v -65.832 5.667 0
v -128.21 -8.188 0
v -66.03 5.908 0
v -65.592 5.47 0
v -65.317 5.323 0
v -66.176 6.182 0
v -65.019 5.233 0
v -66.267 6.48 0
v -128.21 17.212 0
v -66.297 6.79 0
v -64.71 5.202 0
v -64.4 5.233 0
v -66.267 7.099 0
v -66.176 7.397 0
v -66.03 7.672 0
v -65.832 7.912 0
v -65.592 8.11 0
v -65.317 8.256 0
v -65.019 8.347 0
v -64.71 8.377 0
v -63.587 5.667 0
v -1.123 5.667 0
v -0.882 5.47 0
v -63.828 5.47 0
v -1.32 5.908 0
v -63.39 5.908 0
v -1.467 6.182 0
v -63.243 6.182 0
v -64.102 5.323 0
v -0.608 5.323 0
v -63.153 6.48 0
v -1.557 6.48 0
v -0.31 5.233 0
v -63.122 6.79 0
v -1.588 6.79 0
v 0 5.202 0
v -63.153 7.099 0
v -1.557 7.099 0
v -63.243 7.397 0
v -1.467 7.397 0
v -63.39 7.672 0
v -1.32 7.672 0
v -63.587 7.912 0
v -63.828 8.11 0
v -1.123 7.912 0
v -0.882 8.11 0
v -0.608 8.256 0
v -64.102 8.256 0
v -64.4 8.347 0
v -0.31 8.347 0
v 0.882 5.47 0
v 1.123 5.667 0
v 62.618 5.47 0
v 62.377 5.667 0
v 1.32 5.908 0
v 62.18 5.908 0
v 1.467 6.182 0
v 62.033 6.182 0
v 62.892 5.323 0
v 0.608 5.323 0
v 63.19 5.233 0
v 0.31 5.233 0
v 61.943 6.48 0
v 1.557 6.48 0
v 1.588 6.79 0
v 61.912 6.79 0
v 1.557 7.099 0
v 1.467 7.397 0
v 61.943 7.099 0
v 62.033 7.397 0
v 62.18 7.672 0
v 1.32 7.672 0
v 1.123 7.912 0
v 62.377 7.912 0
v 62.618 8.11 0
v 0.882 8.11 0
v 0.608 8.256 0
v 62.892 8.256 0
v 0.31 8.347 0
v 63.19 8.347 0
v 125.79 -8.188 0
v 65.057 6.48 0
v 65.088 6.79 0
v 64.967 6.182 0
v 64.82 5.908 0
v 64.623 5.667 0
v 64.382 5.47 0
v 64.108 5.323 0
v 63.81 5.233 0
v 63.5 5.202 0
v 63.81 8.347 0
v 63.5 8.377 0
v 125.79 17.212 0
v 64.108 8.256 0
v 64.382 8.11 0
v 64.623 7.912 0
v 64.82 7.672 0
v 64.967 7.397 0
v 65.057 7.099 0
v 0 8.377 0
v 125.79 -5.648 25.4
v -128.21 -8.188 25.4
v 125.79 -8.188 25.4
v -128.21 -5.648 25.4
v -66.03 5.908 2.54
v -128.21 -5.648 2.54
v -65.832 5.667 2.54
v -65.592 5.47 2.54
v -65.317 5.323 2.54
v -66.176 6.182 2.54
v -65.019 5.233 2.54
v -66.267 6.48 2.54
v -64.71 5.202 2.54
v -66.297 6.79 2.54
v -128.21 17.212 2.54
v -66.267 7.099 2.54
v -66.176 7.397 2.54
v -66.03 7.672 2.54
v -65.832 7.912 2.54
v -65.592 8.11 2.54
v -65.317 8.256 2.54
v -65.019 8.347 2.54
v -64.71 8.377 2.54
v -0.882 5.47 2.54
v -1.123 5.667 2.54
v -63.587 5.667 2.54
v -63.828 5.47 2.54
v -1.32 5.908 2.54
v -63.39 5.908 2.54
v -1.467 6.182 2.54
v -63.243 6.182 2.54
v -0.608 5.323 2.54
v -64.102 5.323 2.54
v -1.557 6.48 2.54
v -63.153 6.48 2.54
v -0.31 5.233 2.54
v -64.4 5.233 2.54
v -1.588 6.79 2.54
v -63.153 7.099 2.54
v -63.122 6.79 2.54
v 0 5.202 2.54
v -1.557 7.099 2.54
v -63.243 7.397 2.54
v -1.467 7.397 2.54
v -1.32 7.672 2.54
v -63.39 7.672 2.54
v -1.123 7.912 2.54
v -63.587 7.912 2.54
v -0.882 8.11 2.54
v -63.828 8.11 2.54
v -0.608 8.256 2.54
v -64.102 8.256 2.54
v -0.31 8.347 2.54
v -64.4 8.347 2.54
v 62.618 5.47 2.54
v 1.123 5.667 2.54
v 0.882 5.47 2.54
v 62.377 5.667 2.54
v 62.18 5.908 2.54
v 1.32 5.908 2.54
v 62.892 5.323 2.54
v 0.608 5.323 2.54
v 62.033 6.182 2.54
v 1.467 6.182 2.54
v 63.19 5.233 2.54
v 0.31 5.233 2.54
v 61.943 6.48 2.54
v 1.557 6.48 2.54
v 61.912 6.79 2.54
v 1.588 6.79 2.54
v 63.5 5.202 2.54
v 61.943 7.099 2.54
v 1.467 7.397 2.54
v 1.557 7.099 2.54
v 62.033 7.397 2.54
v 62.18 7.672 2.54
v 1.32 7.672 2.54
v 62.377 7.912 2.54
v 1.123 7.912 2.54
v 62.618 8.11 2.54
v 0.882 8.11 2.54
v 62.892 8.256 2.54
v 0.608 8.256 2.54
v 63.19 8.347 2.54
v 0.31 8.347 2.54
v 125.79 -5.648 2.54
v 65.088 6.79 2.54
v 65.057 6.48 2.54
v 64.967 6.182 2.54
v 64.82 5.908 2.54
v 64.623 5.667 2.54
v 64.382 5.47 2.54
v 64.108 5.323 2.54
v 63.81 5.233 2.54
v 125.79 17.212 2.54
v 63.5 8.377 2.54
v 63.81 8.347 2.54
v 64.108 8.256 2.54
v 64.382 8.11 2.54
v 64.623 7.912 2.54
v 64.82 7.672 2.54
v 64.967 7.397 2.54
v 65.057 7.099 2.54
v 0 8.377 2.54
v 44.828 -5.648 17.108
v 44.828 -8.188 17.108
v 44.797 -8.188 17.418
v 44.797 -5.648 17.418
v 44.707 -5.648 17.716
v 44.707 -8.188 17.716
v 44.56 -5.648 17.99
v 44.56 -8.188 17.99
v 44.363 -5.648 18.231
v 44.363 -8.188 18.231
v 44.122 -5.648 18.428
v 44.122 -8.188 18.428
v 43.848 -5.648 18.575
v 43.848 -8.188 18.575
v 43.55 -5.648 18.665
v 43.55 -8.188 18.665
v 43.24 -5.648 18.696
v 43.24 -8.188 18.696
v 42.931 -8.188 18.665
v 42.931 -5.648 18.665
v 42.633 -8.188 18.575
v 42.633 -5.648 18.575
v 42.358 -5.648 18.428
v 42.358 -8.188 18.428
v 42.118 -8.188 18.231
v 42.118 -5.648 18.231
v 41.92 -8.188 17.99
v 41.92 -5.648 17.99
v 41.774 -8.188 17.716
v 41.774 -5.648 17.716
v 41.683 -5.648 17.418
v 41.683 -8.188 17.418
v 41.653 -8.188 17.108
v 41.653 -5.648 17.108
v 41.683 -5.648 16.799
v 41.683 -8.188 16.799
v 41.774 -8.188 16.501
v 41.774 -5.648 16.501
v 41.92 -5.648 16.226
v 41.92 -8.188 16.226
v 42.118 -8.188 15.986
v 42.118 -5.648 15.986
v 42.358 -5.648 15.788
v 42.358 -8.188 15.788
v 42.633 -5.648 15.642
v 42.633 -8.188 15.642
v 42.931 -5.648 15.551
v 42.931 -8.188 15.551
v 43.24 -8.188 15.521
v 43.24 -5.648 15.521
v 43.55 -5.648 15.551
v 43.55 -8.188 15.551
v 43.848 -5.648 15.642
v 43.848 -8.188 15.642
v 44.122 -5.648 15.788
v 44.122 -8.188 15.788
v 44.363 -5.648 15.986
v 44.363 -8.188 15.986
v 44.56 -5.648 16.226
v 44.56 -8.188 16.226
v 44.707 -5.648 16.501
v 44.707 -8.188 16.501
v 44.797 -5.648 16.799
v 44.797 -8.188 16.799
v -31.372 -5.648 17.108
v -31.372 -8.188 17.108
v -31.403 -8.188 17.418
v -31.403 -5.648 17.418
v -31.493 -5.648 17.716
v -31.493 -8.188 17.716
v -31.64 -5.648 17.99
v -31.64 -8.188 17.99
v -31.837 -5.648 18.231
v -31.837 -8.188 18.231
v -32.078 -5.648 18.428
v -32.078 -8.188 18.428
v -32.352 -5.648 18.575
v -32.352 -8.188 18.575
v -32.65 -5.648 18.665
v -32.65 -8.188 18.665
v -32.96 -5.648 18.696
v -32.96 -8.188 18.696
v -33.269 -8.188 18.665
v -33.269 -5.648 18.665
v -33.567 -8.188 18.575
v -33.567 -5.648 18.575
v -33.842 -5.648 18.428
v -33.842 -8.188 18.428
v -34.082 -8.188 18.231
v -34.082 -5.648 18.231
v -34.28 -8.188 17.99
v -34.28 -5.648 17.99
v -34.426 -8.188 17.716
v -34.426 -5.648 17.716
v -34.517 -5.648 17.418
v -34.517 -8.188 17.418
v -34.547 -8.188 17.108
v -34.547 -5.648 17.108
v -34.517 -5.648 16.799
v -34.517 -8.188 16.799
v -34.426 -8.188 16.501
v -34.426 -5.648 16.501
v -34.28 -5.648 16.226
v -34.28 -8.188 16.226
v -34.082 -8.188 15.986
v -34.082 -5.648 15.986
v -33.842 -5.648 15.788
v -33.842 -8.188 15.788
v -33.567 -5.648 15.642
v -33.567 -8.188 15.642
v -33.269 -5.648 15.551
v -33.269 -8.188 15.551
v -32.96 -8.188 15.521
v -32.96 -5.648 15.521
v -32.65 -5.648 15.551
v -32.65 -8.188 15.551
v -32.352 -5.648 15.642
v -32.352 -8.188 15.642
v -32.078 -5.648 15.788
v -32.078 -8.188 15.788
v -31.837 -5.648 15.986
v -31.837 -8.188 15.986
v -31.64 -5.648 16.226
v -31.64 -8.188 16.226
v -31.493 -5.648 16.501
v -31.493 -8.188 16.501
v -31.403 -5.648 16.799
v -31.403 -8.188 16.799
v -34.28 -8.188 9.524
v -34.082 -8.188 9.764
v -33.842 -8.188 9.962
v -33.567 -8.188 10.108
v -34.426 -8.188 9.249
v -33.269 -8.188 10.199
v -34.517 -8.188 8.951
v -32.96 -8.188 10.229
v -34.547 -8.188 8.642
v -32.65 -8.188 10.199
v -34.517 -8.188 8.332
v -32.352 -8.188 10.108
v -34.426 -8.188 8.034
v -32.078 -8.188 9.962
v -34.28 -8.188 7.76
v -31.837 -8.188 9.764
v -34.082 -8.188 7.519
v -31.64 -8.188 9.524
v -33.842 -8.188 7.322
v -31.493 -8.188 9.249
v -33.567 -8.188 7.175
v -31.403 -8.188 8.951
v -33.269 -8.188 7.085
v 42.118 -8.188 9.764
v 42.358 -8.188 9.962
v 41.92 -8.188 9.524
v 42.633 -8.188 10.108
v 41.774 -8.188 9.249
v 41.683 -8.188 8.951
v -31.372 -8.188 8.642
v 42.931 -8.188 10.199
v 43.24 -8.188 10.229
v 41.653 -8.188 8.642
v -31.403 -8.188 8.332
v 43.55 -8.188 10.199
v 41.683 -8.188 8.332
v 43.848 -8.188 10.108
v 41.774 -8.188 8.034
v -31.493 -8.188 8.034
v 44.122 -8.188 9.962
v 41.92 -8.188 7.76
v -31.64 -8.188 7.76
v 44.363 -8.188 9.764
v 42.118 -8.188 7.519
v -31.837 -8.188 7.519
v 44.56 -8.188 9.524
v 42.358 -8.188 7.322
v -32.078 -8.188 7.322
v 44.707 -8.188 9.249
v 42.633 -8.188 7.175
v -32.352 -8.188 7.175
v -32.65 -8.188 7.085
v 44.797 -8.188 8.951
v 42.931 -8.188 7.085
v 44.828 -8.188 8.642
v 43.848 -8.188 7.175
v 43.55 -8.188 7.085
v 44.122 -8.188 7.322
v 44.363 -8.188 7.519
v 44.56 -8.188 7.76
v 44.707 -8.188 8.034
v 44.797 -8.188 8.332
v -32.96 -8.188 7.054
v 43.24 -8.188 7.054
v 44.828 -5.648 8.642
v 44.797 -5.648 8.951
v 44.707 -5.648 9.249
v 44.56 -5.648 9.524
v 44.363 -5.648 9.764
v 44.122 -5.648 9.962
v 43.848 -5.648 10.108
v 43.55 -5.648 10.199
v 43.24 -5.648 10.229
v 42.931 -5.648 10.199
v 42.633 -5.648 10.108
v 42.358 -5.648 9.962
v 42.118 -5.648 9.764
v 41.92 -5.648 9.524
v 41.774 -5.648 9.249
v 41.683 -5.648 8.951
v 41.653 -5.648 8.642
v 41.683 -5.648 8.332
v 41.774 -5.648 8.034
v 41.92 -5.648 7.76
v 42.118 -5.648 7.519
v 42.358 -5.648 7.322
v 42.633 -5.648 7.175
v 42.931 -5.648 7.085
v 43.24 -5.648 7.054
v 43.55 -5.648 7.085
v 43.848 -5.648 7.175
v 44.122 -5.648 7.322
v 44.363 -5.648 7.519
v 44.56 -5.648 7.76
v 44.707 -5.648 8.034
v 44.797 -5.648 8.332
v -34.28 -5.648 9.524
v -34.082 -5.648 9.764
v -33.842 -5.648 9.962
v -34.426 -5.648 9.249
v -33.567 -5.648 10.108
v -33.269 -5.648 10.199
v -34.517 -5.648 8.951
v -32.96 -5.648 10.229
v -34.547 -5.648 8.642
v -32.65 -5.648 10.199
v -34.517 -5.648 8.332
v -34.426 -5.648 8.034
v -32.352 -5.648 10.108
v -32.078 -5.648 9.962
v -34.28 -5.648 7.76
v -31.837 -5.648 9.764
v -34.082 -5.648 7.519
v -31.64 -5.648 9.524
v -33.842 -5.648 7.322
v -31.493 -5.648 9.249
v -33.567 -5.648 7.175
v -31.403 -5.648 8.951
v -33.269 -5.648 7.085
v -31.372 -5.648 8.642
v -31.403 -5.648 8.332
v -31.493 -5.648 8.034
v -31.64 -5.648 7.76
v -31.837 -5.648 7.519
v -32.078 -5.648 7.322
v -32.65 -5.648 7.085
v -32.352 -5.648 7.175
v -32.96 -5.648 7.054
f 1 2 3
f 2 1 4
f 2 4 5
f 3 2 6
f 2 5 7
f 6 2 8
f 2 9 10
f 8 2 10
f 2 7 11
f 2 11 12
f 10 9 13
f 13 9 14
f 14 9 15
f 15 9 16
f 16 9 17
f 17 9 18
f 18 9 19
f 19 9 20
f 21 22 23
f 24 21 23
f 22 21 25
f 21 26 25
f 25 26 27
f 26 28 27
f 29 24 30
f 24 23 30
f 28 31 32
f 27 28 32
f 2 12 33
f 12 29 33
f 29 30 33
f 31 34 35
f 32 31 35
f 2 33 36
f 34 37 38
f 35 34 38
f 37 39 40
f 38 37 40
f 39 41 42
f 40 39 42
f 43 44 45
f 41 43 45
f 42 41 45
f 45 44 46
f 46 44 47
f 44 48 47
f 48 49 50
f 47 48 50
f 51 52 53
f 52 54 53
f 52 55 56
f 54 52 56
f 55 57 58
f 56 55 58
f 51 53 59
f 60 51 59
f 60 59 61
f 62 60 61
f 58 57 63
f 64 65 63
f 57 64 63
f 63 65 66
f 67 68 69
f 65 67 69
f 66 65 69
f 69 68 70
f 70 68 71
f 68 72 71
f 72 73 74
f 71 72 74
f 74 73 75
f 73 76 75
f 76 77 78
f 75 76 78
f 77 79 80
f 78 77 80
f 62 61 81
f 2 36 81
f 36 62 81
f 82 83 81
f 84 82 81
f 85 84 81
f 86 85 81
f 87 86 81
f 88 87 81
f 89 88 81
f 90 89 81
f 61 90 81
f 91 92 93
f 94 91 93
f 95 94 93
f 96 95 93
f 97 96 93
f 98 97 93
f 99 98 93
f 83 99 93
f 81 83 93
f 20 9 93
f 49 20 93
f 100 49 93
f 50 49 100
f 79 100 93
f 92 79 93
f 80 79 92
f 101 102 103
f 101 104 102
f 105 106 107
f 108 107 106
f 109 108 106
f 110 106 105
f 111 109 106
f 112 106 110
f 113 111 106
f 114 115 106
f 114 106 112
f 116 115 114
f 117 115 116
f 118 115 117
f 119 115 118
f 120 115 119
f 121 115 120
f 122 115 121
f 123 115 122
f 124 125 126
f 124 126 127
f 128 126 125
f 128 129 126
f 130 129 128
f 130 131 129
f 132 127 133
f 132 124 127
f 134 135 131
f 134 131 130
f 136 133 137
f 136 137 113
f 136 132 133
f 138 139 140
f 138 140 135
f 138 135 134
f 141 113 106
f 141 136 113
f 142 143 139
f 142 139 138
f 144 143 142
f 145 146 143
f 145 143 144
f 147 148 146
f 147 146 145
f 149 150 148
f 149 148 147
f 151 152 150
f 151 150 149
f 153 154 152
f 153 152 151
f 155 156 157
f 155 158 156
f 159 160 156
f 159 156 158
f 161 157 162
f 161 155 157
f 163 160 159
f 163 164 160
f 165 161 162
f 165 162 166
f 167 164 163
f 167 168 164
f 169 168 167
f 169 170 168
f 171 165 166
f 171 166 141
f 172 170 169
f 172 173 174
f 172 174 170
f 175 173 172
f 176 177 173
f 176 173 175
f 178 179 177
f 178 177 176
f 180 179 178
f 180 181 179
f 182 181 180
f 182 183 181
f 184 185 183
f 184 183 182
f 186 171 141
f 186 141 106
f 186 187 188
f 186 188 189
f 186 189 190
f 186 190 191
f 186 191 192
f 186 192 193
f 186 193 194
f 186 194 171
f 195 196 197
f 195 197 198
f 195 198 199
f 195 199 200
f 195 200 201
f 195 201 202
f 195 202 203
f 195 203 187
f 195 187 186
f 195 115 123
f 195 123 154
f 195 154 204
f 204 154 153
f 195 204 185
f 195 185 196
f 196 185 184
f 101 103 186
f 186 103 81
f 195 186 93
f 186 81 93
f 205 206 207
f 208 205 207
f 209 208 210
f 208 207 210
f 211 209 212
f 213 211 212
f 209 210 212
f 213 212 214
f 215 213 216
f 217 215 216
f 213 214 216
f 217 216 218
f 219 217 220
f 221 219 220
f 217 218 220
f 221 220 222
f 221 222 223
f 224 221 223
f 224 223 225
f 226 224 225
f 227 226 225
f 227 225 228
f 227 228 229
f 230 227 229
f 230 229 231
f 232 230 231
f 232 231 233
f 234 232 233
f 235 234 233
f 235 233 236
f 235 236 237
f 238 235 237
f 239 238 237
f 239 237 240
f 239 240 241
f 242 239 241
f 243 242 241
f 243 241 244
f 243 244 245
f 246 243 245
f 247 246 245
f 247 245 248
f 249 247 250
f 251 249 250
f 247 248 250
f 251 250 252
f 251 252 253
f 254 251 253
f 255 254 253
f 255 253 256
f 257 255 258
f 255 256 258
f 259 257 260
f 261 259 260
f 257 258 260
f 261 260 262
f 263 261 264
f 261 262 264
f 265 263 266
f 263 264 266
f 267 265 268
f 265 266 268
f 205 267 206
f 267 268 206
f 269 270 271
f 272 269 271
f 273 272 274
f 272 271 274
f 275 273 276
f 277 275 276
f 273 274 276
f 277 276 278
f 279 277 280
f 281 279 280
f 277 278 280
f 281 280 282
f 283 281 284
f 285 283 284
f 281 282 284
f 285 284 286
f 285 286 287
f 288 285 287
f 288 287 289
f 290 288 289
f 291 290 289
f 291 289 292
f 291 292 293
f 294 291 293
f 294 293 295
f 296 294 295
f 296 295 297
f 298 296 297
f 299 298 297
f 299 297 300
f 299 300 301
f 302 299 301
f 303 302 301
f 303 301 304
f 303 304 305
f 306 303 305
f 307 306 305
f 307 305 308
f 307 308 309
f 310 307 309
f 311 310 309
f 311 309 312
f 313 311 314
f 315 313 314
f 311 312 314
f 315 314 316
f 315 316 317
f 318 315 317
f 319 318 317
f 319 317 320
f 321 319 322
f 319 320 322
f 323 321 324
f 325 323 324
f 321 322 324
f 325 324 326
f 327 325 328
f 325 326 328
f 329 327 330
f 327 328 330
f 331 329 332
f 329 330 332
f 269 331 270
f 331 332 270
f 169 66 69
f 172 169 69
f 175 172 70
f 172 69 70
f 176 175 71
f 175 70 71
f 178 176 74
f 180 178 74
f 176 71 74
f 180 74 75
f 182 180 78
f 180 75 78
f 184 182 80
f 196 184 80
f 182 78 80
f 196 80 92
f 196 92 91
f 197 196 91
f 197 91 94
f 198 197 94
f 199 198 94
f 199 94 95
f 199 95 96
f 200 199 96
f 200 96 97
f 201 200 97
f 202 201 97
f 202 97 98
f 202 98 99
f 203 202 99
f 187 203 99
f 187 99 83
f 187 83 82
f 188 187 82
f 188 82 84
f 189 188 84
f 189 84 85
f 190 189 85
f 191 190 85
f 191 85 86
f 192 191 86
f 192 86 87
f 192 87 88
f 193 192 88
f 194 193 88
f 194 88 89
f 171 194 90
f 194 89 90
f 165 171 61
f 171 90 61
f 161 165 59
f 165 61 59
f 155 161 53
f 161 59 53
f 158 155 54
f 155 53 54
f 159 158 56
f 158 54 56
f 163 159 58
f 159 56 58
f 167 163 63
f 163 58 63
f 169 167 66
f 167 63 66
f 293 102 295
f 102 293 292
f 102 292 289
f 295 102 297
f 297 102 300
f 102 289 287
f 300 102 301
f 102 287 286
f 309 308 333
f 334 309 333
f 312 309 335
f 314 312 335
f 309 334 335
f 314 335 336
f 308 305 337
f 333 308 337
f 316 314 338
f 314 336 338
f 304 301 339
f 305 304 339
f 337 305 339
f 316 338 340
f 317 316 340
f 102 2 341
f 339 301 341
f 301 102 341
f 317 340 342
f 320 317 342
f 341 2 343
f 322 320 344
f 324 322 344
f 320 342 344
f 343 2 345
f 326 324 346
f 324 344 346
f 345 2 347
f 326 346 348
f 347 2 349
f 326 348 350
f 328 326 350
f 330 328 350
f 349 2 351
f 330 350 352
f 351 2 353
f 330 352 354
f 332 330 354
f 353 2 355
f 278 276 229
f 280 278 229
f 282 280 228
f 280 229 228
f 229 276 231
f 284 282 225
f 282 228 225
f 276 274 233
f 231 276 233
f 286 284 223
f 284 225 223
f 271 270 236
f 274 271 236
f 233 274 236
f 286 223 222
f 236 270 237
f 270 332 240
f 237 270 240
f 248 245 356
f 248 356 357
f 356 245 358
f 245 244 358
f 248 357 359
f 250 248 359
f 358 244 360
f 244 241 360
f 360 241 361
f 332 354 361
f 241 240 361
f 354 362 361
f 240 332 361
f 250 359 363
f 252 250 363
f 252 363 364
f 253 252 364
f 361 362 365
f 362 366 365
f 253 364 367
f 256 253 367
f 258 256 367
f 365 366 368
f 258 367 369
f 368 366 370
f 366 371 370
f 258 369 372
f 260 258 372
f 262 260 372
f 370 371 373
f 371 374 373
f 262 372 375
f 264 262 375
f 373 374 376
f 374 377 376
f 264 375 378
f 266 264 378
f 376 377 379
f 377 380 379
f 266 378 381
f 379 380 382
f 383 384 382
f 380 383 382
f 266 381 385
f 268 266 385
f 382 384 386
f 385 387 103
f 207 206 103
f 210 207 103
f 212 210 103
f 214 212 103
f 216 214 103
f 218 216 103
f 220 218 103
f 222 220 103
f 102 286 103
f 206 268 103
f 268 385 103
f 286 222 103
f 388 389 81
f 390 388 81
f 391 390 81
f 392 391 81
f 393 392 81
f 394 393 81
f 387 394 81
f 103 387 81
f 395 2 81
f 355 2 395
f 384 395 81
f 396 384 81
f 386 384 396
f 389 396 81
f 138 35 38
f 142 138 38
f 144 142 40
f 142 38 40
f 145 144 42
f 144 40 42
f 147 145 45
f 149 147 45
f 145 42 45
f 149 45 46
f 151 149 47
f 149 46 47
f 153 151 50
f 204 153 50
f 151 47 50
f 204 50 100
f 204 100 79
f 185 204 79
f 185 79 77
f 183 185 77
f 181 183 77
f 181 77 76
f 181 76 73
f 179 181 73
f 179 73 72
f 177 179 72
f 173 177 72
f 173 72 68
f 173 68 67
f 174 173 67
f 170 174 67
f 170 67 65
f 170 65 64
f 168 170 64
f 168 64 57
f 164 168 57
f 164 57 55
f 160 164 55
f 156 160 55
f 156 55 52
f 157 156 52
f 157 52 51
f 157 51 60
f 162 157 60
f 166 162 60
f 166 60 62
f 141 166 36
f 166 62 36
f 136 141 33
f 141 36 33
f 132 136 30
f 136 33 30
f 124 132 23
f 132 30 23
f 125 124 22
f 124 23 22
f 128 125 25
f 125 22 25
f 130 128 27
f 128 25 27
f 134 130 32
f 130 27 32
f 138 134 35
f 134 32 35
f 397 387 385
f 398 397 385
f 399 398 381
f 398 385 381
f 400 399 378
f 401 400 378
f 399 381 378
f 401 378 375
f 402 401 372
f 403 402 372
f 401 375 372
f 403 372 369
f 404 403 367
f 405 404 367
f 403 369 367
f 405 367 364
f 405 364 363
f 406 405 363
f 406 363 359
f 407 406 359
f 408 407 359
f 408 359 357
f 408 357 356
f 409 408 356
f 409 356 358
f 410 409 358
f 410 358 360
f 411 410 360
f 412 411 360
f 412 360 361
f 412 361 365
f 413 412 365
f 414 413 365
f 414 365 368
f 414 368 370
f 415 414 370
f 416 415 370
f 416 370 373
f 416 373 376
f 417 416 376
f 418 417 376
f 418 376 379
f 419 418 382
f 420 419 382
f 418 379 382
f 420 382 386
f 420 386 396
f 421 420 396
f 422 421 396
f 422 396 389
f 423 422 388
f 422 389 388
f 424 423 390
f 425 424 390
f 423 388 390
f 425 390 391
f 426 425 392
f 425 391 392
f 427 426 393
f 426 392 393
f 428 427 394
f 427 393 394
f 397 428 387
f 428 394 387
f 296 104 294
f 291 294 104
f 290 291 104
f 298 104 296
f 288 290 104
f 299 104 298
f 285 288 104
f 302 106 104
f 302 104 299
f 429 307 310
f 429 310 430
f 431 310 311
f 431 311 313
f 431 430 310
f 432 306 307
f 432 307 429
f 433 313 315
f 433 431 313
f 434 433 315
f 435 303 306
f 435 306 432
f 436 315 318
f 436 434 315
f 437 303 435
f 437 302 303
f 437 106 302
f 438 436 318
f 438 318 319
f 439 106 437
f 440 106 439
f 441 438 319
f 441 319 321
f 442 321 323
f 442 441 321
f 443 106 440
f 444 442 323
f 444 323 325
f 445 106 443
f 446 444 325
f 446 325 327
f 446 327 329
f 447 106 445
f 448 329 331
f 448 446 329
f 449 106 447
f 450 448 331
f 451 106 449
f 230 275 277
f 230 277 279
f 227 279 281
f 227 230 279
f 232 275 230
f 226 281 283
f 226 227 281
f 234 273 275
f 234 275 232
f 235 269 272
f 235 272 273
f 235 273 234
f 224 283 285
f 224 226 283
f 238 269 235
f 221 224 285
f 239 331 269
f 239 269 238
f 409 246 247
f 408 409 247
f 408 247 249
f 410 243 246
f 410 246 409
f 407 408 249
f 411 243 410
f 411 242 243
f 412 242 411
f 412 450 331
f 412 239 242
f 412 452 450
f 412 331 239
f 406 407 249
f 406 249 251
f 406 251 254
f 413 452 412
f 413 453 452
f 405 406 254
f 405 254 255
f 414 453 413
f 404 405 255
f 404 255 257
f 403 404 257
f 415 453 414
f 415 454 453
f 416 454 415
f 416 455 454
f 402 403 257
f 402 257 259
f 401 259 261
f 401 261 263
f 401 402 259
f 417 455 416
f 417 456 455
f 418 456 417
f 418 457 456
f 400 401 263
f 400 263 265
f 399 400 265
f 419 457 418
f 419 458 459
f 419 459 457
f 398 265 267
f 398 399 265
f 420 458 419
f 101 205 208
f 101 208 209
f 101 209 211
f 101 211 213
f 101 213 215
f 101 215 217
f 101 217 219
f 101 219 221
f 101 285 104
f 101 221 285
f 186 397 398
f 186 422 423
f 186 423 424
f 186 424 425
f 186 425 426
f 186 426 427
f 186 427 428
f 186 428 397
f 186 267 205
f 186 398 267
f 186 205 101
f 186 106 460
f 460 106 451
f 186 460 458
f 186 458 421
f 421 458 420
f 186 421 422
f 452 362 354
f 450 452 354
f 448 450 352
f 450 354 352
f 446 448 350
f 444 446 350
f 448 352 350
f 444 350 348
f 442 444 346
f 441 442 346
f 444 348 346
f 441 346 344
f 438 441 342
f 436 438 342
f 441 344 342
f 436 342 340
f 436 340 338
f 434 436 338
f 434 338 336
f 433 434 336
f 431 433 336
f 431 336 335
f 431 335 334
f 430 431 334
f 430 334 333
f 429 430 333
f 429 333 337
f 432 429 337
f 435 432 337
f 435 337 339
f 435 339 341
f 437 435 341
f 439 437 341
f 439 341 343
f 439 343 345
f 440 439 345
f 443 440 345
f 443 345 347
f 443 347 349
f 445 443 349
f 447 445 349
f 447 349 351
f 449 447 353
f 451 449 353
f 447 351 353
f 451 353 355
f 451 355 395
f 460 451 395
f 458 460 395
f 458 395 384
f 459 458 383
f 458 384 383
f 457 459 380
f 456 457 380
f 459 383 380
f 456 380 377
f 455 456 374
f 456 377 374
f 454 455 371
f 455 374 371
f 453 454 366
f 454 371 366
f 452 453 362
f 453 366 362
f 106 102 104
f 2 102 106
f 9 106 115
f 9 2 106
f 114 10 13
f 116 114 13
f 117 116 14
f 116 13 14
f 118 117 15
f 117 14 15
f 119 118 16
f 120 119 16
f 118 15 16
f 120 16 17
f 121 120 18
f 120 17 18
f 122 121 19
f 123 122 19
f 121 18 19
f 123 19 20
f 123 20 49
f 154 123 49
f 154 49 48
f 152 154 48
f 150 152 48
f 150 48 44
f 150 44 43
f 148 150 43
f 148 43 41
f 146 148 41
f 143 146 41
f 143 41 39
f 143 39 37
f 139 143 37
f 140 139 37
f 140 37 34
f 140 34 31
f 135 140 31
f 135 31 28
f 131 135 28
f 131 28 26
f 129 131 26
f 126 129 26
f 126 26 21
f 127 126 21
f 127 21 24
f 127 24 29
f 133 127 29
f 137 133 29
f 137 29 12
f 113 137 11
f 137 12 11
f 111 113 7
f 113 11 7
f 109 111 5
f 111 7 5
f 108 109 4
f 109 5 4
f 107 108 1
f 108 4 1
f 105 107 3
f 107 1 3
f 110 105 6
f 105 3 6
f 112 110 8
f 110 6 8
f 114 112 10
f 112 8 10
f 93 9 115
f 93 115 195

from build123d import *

# Parameters (mm, degrees)
F0_W     = 254
F0_H     = 25.4
F1_DEPTH = 25.4
F2_T     = -2.54
F4_D     = 3.175
F6_D     = 3.175


with BuildPart() as f1:
    # F0 (on Top) → F1 (new body)
    with BuildSketch(Plane.XY):
        with Locations((-1.209586, 4.511842)):
            Rectangle(F0_W, F0_H)
    extrude(amount=F1_DEPTH)

    # F2
    f2_openings = [f1.faces().sort_by_distance(p)[0] for p in [
        (-1.209586, 4.511842, 25.4),
        (-1.209586, 17.211842, 12.7),
        (125.790414, 4.511842, 12.7),
        (-128.209586, 4.511842, 12.7),
    ]]
    offset(amount=F2_T, openings=f2_openings)

    # F4 (through all)
    with Locations(Plane.XY.offset(2.54)):
        with Locations((63.5, 6.789771), (0, 6.789771), (-64.709586, 6.789771)):
            Hole(F4_D / 2)

    # F6 (through all)
    with Locations(Plane(origin=(0, -5.648158, 0), x_dir=(-1, 0, 0), z_dir=(0, 1, 0))):
        with Locations((-43.240414, 8.641747), (-43.240414, 17.108414), (32.959586, 17.108414), (32.959586, 8.641747)):
            Hole(F6_D / 2)


solid = f1.part
